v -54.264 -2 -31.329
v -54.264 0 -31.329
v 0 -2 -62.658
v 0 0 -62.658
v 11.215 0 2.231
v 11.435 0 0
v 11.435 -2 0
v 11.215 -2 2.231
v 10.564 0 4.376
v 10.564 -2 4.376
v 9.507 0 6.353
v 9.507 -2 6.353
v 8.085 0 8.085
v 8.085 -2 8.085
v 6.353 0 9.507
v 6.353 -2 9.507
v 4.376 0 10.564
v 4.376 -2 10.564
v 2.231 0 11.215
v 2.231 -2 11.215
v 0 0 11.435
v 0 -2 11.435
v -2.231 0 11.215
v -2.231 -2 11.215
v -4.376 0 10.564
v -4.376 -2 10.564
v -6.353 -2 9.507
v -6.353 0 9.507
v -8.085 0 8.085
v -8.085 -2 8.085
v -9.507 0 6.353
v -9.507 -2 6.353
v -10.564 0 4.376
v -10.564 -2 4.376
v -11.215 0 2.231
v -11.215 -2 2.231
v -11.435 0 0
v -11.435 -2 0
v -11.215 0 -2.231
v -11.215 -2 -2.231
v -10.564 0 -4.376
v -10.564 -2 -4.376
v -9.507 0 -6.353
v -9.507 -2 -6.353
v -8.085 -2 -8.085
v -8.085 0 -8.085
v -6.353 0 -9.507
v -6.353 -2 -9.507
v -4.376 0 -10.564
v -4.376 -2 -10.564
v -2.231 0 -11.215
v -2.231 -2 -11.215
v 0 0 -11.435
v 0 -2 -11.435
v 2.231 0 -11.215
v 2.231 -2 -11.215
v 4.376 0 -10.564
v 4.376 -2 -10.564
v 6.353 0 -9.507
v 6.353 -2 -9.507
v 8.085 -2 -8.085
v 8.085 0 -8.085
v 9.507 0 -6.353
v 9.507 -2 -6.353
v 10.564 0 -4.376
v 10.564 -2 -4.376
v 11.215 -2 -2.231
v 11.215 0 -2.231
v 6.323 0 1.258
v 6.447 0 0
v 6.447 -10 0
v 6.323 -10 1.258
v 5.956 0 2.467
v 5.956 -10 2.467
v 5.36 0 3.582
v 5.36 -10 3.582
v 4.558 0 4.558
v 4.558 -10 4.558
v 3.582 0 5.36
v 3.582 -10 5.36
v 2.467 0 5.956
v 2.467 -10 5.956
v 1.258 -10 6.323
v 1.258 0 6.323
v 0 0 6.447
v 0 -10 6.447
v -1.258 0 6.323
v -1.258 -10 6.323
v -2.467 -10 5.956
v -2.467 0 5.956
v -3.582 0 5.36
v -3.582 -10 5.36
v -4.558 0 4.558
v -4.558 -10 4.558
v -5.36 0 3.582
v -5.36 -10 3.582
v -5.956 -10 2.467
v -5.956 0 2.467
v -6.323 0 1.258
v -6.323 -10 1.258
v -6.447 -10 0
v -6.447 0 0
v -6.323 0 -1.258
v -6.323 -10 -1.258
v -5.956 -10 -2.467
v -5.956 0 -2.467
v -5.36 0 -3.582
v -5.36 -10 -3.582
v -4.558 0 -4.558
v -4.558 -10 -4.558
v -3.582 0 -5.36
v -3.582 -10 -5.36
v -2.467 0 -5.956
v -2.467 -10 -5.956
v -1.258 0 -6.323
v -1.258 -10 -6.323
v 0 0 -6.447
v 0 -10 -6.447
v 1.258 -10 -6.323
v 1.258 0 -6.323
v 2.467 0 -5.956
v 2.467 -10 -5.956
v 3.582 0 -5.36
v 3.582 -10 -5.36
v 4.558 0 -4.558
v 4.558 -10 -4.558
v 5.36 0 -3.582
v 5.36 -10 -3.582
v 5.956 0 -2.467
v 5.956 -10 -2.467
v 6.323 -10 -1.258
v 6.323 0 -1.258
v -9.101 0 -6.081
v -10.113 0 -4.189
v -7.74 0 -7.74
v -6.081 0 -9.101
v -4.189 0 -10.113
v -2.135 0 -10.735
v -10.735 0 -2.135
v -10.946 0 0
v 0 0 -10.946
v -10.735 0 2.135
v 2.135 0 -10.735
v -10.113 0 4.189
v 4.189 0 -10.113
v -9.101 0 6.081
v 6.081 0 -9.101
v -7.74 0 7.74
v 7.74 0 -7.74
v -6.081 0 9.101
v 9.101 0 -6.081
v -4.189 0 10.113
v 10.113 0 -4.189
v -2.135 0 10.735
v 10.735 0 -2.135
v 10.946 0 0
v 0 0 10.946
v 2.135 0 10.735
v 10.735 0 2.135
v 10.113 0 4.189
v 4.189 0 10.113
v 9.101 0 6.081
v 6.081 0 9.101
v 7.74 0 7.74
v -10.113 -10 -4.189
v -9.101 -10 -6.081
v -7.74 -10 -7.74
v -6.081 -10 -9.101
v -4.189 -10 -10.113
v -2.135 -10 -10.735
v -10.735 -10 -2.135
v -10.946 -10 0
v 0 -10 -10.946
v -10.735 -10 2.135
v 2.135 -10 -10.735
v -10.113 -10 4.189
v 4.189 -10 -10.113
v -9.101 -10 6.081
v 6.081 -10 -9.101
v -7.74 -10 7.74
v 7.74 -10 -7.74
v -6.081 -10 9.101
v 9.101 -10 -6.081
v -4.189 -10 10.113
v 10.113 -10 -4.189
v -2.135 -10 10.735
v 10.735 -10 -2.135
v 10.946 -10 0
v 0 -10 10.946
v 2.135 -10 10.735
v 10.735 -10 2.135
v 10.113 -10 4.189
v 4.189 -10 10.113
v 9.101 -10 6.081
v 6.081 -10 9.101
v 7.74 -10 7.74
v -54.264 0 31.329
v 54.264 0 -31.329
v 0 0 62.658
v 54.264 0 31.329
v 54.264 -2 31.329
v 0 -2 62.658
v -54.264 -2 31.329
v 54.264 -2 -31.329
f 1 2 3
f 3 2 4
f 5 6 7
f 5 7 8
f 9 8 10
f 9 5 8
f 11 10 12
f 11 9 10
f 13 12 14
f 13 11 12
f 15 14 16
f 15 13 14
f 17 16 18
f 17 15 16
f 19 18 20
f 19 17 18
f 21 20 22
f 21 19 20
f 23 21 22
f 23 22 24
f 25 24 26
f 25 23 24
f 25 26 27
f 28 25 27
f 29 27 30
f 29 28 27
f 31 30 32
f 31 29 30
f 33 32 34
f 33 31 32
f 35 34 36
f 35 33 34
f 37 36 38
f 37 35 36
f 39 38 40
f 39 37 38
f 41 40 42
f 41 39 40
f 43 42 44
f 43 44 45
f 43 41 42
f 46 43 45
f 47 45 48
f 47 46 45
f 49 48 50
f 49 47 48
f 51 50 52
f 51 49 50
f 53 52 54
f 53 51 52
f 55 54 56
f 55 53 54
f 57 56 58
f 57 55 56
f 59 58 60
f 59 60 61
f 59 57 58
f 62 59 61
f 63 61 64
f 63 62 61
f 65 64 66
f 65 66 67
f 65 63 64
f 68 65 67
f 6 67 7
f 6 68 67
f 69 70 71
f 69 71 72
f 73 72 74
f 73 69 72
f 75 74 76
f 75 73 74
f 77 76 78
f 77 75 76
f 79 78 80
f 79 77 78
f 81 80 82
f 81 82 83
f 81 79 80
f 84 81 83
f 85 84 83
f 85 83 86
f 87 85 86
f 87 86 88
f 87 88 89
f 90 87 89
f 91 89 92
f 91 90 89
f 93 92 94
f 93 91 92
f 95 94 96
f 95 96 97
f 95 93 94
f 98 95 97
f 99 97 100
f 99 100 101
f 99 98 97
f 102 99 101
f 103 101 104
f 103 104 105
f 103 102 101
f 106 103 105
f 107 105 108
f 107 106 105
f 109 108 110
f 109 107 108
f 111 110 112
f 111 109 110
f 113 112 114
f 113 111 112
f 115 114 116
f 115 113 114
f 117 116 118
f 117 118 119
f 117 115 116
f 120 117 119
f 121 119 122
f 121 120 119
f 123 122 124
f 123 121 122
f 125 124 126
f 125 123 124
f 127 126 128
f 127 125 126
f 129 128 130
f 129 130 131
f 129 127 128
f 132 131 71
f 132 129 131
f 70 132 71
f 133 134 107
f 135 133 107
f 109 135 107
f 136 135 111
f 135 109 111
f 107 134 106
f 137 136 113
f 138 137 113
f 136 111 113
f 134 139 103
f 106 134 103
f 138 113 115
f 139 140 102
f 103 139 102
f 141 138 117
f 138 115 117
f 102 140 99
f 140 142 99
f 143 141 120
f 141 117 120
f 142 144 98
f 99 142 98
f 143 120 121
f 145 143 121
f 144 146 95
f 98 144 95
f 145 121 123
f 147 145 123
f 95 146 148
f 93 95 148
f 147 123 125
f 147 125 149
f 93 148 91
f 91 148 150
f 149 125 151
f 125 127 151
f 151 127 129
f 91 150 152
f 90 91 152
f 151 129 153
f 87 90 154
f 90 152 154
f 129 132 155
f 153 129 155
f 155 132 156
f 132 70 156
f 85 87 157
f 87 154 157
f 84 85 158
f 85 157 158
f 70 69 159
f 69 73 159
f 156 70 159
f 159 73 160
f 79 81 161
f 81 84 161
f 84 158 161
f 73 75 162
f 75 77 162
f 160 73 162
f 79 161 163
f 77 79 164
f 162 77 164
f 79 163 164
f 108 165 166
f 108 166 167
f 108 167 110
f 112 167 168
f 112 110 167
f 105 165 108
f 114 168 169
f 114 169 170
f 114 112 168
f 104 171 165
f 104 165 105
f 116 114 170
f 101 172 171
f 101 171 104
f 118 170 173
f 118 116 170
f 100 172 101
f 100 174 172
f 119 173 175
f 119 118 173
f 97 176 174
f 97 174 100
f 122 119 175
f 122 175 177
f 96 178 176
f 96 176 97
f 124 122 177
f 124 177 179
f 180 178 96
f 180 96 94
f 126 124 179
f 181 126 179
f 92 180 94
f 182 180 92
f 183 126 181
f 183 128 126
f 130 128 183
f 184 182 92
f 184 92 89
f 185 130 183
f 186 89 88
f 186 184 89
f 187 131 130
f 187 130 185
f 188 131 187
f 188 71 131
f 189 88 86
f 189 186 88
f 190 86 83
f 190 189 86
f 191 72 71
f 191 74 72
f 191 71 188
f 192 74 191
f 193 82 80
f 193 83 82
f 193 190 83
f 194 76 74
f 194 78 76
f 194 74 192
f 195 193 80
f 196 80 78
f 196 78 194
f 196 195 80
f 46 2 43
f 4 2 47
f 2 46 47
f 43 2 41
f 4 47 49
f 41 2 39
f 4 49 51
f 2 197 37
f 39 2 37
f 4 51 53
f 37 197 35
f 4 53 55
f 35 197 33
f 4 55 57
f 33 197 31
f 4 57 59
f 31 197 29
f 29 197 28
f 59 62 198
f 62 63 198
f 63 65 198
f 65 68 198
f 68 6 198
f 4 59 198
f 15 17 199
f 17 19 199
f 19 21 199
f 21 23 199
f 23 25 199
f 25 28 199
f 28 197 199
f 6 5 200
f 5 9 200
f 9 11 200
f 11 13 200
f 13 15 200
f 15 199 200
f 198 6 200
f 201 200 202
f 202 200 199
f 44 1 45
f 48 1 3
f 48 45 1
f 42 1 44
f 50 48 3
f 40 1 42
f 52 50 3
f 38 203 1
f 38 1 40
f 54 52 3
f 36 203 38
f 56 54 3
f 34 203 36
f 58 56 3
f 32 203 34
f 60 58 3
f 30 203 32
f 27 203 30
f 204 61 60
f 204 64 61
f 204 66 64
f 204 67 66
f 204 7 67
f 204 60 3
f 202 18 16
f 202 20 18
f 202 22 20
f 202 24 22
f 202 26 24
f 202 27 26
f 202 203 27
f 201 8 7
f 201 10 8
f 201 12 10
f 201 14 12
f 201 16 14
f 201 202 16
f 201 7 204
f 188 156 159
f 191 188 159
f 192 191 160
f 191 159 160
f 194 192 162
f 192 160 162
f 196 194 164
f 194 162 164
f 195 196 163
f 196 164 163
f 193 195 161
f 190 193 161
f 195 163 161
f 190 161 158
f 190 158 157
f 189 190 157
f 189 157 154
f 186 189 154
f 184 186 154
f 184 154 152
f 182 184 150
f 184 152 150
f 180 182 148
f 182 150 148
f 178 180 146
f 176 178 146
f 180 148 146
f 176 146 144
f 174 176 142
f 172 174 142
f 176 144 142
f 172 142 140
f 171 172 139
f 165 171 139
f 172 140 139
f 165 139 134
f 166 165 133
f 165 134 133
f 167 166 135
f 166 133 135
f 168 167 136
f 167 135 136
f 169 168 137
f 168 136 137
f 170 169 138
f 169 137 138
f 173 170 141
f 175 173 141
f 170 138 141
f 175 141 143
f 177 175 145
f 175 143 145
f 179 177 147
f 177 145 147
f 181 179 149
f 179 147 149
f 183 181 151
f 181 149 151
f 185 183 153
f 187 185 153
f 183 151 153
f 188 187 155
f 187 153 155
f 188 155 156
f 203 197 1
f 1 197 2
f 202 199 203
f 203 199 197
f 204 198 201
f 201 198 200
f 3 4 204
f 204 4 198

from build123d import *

# Parameters (mm, degrees)
F0_R     = 11.434559
F1_DEPTH = 2
F2_R     = 10.945727
F2_R_2   = 6.446602
F3_DEPTH = 10


with BuildPart() as f1:
    # F0 (on Front) → F1 (new body)
    with BuildSketch(Plane.XZ):
        Polygon((-54.263688, -31.329155), (0, -62.65831), (54.263688, -31.329155), (54.263688, 31.329155), (0, 62.65831), (-54.263688, 31.329155), align=None)
        Circle(F0_R, mode=Mode.SUBTRACT)
    extrude(amount=F1_DEPTH)


with BuildPart() as f3:
    # F2 (on Front) → F3 (new body)
    with BuildSketch(Plane.XZ):
        Circle(F2_R)
        Circle(F2_R_2, mode=Mode.SUBTRACT)
    extrude(amount=F3_DEPTH)


solid = Compound([f1.part, f3.part])
